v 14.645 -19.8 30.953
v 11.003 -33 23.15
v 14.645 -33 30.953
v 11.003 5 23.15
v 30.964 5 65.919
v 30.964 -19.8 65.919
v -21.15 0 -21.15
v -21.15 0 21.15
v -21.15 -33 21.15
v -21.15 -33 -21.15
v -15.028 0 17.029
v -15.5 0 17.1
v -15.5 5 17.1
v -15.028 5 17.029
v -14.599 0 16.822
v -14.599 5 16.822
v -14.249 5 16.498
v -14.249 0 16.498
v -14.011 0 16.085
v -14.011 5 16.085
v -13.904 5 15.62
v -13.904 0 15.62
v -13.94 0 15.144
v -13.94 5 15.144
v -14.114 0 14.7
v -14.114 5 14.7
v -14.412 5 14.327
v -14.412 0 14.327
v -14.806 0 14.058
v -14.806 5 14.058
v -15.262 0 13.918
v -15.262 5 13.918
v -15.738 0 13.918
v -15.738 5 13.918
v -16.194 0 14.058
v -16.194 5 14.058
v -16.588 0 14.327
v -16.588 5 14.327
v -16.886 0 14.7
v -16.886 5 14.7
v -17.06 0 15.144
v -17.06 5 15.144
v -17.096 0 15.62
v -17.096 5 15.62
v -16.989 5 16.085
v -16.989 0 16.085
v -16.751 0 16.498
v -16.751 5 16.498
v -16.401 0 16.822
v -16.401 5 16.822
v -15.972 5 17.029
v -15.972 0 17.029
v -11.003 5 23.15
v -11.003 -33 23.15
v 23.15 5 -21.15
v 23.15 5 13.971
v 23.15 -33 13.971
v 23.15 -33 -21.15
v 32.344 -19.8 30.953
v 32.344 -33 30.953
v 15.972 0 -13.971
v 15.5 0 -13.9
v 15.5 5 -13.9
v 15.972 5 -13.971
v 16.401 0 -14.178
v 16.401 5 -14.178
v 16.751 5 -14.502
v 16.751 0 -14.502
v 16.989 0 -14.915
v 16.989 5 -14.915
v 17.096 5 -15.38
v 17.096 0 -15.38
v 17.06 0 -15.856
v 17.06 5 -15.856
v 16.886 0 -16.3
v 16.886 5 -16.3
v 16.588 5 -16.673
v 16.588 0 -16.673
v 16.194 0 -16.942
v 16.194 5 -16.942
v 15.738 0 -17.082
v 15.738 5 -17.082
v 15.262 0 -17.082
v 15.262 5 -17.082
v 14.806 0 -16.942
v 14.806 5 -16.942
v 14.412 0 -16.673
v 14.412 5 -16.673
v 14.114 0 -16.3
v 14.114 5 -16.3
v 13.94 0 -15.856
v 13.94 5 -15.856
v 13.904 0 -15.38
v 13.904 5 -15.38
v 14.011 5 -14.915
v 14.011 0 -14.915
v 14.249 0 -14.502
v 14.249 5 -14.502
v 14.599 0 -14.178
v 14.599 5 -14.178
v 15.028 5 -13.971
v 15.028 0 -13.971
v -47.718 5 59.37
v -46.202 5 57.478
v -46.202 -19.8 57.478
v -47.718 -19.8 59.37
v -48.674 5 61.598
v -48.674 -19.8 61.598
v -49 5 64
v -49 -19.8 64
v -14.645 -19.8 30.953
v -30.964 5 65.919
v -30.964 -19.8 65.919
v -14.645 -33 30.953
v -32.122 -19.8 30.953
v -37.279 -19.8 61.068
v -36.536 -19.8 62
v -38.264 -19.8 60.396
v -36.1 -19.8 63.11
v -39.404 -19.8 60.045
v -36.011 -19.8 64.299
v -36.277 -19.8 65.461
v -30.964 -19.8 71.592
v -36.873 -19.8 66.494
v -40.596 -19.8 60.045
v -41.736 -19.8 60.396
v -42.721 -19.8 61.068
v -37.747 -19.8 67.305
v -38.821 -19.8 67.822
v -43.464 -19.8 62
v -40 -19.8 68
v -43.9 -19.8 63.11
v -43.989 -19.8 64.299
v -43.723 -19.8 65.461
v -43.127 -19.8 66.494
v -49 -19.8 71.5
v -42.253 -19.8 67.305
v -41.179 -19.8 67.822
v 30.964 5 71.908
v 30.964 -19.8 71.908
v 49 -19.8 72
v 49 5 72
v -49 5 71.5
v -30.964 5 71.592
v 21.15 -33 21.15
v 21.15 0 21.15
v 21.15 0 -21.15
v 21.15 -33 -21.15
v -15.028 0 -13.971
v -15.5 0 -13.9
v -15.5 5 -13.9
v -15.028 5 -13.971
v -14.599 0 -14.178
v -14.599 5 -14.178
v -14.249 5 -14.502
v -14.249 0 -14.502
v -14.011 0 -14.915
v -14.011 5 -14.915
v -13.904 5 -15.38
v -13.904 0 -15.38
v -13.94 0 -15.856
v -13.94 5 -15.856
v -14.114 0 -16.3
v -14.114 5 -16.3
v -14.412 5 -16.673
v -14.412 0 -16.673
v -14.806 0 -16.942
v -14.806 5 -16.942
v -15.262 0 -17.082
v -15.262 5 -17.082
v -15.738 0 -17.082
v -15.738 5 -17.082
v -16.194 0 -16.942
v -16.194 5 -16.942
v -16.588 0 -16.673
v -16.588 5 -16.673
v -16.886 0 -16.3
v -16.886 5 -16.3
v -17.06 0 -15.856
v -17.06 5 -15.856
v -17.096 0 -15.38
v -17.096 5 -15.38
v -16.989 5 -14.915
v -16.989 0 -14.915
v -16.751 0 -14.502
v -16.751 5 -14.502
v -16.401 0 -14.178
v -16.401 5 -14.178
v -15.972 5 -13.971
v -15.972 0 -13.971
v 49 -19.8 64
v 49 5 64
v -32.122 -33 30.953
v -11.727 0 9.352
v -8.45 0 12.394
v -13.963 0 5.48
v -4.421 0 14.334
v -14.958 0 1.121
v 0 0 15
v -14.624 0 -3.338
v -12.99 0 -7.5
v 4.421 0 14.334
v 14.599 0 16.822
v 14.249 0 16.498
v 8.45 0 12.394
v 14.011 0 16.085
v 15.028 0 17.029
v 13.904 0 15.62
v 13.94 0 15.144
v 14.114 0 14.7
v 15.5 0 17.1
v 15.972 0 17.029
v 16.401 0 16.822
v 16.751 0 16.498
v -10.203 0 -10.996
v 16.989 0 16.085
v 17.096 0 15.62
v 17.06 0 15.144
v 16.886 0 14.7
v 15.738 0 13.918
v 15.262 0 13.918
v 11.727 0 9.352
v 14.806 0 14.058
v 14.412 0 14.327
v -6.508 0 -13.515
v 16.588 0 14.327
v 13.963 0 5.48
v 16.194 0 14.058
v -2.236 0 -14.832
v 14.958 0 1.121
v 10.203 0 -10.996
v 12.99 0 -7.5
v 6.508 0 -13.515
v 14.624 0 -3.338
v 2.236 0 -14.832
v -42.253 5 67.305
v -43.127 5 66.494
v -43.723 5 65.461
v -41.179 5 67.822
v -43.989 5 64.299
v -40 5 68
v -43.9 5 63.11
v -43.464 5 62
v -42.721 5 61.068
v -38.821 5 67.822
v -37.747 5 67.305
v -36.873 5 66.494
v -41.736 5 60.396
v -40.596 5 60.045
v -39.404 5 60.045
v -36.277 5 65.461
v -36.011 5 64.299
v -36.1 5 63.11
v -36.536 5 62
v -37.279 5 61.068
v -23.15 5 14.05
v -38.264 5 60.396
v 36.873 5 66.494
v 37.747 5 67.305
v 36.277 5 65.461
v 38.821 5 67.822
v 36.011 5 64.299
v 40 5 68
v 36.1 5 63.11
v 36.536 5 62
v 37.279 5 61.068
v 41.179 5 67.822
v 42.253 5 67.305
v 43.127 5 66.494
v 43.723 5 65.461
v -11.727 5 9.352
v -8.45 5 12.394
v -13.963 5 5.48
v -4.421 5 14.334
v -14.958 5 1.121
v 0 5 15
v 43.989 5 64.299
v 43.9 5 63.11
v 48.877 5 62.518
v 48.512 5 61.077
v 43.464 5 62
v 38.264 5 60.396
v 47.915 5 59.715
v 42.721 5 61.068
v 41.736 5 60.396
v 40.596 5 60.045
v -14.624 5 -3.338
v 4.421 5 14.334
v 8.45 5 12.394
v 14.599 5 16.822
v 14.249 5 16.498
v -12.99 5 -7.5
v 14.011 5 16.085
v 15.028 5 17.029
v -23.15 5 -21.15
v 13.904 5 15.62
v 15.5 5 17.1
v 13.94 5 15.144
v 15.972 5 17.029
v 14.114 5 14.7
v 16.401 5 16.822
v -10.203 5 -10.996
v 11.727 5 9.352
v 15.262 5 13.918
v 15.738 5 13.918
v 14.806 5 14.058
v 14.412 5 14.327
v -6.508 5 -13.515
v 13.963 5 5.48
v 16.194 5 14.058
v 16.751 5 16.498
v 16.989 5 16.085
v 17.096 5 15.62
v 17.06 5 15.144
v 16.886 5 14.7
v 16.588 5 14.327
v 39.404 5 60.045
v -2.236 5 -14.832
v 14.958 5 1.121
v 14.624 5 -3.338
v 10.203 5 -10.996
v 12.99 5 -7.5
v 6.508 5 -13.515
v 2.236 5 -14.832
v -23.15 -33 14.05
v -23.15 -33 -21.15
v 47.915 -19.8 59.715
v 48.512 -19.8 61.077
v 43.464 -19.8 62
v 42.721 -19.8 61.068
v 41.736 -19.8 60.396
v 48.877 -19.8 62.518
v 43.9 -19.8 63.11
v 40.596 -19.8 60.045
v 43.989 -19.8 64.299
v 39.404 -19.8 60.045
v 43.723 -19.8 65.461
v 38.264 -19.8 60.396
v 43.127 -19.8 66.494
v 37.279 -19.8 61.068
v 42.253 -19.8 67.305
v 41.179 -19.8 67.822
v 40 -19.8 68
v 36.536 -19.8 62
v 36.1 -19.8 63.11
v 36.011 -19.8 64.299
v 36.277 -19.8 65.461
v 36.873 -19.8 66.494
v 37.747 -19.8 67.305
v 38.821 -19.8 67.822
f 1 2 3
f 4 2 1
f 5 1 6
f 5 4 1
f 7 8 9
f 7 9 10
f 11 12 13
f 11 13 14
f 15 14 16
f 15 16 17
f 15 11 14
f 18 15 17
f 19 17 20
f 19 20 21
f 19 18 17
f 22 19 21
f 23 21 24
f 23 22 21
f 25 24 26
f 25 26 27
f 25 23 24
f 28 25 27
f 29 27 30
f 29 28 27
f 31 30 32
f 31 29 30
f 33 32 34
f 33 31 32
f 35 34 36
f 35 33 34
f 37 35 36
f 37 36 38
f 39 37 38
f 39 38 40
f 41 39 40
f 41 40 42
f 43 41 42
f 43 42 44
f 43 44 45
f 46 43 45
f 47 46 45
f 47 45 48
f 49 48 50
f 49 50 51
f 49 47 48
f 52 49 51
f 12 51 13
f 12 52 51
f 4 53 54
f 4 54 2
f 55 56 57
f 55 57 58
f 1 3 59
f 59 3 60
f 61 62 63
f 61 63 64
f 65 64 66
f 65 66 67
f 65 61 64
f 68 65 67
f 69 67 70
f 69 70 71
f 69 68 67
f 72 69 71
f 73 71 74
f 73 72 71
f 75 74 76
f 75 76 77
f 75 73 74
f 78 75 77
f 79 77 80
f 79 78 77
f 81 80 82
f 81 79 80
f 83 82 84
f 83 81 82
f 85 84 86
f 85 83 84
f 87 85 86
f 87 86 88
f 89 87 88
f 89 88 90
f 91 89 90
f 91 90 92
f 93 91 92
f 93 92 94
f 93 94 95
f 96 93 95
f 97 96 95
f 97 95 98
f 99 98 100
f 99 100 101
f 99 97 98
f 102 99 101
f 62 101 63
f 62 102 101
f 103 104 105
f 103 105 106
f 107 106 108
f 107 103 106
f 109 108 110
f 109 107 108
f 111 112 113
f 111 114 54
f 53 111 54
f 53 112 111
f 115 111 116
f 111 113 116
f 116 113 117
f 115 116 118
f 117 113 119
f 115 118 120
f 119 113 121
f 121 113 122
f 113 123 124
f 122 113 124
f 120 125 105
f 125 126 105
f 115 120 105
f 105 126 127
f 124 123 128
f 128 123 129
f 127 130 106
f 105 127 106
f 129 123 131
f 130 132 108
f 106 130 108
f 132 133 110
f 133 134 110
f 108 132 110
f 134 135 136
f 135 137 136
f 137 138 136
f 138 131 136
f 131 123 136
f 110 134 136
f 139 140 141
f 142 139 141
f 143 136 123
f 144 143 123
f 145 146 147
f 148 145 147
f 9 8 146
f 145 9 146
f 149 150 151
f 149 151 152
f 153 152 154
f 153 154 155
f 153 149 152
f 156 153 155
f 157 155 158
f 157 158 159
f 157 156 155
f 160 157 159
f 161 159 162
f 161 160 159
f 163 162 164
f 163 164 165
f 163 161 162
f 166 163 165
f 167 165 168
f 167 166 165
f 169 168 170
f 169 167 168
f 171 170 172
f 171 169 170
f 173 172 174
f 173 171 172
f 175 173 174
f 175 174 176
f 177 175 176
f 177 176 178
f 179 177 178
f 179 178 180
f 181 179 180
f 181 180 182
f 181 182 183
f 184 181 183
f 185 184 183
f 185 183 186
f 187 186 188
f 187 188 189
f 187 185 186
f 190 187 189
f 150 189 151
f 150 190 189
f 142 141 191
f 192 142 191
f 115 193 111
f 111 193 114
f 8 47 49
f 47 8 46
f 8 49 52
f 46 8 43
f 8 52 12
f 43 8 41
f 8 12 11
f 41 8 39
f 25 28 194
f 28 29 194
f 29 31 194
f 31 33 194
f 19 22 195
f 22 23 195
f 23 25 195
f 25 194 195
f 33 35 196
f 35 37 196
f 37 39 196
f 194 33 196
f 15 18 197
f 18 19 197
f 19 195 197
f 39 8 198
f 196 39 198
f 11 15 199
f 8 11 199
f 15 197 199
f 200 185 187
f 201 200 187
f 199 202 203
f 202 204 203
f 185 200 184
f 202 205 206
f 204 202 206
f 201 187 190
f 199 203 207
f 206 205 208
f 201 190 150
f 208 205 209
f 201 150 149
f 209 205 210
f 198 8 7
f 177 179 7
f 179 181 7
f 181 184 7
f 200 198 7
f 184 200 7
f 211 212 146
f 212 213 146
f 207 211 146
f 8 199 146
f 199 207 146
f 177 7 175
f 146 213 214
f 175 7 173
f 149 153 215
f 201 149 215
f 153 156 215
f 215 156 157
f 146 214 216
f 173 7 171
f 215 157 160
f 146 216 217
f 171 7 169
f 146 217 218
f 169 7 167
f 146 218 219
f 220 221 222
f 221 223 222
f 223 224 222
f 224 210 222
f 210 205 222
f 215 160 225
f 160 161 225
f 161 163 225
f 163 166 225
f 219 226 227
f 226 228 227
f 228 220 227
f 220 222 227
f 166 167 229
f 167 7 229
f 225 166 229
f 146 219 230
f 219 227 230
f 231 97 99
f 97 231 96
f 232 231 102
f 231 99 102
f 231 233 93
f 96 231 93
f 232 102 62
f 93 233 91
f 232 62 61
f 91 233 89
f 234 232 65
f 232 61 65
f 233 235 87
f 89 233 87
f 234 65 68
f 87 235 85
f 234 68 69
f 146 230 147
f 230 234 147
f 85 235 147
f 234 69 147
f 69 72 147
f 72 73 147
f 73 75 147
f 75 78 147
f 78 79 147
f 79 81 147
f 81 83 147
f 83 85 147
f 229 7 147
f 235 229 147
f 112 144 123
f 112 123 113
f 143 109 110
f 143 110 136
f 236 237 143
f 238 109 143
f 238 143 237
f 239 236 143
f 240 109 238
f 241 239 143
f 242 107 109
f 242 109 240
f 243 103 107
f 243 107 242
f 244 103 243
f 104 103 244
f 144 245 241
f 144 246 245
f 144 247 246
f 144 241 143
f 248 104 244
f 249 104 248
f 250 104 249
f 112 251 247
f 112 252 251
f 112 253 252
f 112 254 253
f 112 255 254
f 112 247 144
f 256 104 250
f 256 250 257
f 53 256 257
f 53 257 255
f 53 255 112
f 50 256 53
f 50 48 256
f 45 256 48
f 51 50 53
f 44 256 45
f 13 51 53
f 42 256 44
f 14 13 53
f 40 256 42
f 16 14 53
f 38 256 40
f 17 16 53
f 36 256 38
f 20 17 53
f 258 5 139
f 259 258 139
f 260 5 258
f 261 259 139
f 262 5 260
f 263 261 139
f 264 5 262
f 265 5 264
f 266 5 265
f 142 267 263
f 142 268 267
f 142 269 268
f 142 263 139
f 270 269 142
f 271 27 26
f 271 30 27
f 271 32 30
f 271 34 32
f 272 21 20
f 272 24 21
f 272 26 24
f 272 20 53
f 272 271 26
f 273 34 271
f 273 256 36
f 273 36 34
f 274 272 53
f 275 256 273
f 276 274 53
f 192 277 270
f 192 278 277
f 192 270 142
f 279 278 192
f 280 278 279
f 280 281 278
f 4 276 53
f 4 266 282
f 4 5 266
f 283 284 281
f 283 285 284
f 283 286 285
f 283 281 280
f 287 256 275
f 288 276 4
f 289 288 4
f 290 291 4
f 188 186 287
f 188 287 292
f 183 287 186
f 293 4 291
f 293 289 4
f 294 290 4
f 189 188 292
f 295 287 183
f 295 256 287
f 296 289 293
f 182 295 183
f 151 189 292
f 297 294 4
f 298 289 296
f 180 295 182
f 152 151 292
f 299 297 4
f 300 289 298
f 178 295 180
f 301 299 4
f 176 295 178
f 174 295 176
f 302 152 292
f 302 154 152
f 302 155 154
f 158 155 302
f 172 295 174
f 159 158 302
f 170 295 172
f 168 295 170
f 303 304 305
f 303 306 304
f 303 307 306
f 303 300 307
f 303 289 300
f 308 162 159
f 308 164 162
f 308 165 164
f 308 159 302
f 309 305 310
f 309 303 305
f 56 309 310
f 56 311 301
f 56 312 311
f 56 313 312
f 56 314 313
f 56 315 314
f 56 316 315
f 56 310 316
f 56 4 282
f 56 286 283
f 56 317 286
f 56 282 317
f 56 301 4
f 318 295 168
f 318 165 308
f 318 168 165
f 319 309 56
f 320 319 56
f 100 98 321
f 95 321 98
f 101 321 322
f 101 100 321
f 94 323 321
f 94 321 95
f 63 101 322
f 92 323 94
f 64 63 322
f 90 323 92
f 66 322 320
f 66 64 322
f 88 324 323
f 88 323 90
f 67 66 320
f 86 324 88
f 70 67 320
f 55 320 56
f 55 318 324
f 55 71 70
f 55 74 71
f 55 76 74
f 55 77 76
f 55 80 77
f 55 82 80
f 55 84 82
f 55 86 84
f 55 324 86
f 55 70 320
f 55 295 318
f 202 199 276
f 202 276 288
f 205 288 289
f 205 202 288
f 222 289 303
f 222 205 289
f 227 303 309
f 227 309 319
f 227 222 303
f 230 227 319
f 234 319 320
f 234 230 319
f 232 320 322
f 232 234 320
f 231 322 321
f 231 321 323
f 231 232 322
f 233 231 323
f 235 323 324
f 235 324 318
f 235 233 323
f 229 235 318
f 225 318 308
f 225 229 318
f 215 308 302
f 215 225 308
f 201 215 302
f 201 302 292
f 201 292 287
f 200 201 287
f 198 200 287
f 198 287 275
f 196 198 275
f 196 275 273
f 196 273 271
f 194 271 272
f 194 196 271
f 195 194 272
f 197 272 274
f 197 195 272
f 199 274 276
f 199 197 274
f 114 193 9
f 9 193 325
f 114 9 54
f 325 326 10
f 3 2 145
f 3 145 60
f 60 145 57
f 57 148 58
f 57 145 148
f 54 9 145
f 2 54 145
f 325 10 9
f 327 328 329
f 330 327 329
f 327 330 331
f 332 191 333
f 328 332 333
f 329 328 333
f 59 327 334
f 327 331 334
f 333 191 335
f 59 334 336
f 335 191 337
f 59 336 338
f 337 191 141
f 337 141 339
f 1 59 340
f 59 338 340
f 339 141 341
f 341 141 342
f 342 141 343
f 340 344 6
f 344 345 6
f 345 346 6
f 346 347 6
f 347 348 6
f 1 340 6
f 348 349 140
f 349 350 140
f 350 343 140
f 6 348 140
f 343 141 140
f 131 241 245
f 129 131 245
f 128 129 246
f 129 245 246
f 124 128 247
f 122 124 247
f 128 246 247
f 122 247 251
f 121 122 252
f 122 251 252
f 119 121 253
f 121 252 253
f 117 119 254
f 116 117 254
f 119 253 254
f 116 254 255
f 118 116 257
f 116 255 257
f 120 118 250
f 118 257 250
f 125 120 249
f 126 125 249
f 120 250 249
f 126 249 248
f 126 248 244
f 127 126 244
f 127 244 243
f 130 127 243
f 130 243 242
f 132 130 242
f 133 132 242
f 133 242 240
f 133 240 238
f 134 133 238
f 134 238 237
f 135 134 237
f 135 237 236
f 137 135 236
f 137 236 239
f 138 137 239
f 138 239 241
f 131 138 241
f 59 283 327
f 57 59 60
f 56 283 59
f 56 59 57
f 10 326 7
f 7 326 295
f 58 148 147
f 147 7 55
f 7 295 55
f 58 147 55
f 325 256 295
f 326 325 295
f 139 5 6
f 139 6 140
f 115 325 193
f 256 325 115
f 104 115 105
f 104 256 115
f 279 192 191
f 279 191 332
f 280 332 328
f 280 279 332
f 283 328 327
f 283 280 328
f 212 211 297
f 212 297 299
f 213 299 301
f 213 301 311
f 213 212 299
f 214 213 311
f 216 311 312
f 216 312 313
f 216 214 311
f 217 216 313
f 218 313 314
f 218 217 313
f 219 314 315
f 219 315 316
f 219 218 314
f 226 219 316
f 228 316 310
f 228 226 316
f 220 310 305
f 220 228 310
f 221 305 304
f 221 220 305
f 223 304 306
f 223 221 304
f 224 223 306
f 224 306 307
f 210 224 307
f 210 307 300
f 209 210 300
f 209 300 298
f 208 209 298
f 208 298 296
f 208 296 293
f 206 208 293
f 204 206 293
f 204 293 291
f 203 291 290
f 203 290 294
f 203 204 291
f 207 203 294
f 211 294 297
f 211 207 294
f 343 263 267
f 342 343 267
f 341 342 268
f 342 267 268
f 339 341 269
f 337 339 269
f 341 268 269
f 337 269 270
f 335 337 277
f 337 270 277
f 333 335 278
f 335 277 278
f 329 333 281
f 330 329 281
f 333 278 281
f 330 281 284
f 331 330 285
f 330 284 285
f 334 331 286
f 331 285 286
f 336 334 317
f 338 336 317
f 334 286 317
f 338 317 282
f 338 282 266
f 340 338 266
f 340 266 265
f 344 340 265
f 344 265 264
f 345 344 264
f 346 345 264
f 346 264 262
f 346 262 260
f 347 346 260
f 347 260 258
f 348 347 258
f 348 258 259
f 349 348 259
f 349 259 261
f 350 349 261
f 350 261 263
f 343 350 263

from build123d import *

# Parameters (mm, degrees)
SKETCH_6_W          = 42.3
SKETCH_6_H          = 42.3
SKETCH_6_R          = 1.6
SKETCH_6_R_2        = 15
EXTRUDE_1_DEPTH     = 5
SKETCH_7_R          = 4
EXTRUDE_5_DEPTH     = 38
EXTRUDE_START       = 38
SKETCH_7_7_R        = 4
EXTRUDE_7_DEPTH     = 38
SKETCH_7_8_R        = 4
EXTRUDE_8_DEPTH     = 38
SKETCH_12_W         = 2
SKETCH_12_H         = 44.3
EXTRUDE_11_DEPTH    = 38
SKETCH_14_W         = 44.3
SKETCH_14_H         = 2
EXTRUDE_12_DEPTH    = 38
SKETCH_15_W         = 2
SKETCH_15_H         = 42.3
EXTRUDE_13_DEPTH    = 38
CUT_EXTRUDE_1_DEPTH = 13.2


with BuildPart() as part:
    # 草图6 → 凸台-拉伸1 (new body)
    with BuildSketch(Plane(origin=(0, 0, 0), x_dir=(1, 0, 0), z_dir=(0, 1, 0))):
        Rectangle(SKETCH_6_W, SKETCH_6_H)
        with Locations(Location((15.5, 15.5, 0), (0, 0, 270))):
            Circle(SKETCH_6_R, mode=Mode.SUBTRACT)
        with Locations(Location((-15.5, 15.5, 0), (0, 0, 270))):
            Circle(SKETCH_6_R, mode=Mode.SUBTRACT)
        with Locations(Location((-15.5, -15.5, 0), (0, 0, 270))):
            Circle(SKETCH_6_R, mode=Mode.SUBTRACT)
        with Locations(Location((15.5, -15.5, 0), (0, 0, 270))):
            Circle(SKETCH_6_R, mode=Mode.SUBTRACT)
        with Locations(Location((0, 0, 0), (0, 0, 270))):
            Circle(SKETCH_6_R_2, mode=Mode.SUBTRACT)
    extrude(amount=EXTRUDE_1_DEPTH)

    # 草图7 → 凸台-拉伸5 (add)
    # profile 1 of 2: a face of its own
    with BuildSketch(Plane(origin=(0, 5, 0), x_dir=(1, 0, 0), z_dir=(0, 1, 0))):
        with BuildLine():
            Line((49, -72), (49, -64))
            ThreePointArc((49, -64), (48.724429591, -61.789948347), (47.914593709, -59.715235547))
            Line((47.914593709, -59.715235547), (21.15, -10.277072187))
            Line((21.15, -10.277072187), (21.15, -21.15))
            Line((21.15, -21.15), (10.070005019, -21.15))
            Line((10.070005019, -21.15), (30.963898233, -65.919418373))
            Line((30.963898233, -65.919418373), (30.963898233, -71.907979073))
            Line((30.963898233, -71.907979073), (49, -72))
        make_face()
        with Locations(Location((40, -64, 0), (0, 0, 270))):
            Circle(SKETCH_7_R, mode=Mode.SUBTRACT)
    # profile 2 of 2: a face of its own
    with BuildSketch(Plane(origin=(0, 5, 0), x_dir=(1, 0, 0), z_dir=(0, 1, 0))):
        with BuildLine():
            Line((-30.963898233, -65.919418373), (-10.070005019, -21.15))
            Line((-10.070005019, -21.15), (-21.15, -21.15))
            Line((-21.15, -21.15), (-21.15, -10.282583808))
            Line((-21.15, -10.282583808), (-46.202269248, -57.478354795))
            ThreePointArc((-46.202269248, -57.478354795), (-48.271046585, -60.45179082), (-49, -64))
            Line((-49, -64), (-49, -71.5))
            Line((-49, -71.5), (-30.963898233, -71.592020927))
            Line((-30.963898233, -71.592020927), (-30.963898233, -65.919418373))
        make_face()
        with Locations(Location((-40, -64, 0), (0, 0, 270))):
            Circle(SKETCH_7_R, mode=Mode.SUBTRACT)
    extrude(amount=-EXTRUDE_5_DEPTH)

    # 草图7<7> → 凸台-拉伸7 (add)
    with BuildSketch(Plane(origin=(0, 5, 0), x_dir=(1, 0, 0), z_dir=(0, 1, 0)).offset(EXTRUDE_START)):
        with Locations(Location((-40, -64, 0), (0, 0, 270))):
            Circle(SKETCH_7_7_R)
        with Locations(Location((40, -64, 0), (0, 0, 270))):
            Circle(SKETCH_7_7_R)
    extrude(amount=-EXTRUDE_7_DEPTH)


with BuildPart() as extrude_7_kept_piece:
    # of the separate pieces the step leaves, the one the design keeps (extrude_7_pieces_kept)
    add(part.part.solids().sort_by_distance((-10.070005019, 0, 21.15))[0])

    # 草图7<8> → 凸台-拉伸8 (add)
    with BuildSketch(Plane(origin=(0, 5, 0), x_dir=(1, 0, 0), z_dir=(0, 1, 0))):
        with Locations(Location((-40, -64, 0), (0, 0, 270))):
            Circle(SKETCH_7_8_R)
        with Locations(Location((40, -64, 0), (0, 0, 270))):
            Circle(SKETCH_7_8_R)
    extrude(amount=EXTRUDE_8_DEPTH)


with BuildPart() as extrude_8_kept_piece:
    # of the separate pieces the step leaves, the one the design keeps (extrude_8_pieces_kept)
    add(extrude_7_kept_piece.part.solids().sort_by_distance((-10.070005019, 0, 21.15))[0])

    # 草图12 → 凸台-拉伸11 (add)
    with BuildSketch(Plane(origin=(0, 5, 0), x_dir=(1, 0, 0), z_dir=(0, 1, 0))):
        with Locations((22.15, -1)):
            Rectangle(SKETCH_12_W, SKETCH_12_H)
    extrude(amount=-EXTRUDE_11_DEPTH)

    # 草图14 → 凸台-拉伸12 (add)
    with BuildSketch(Plane(origin=(0, 5, 0), x_dir=(1, 0, 0), z_dir=(0, 1, 0))):
        with Locations((-1, -22.15)):
            Rectangle(SKETCH_14_W, SKETCH_14_H)
    extrude(amount=-EXTRUDE_12_DEPTH)

    # 草图15 → 凸台-拉伸13 (add)
    with BuildSketch(Plane(origin=(0, 5, 0), x_dir=(1, 0, 0), z_dir=(0, 1, 0))):
        with Locations((-22.15, 0)):
            Rectangle(SKETCH_15_W, SKETCH_15_H)
    extrude(amount=-EXTRUDE_13_DEPTH)

    # 草图17 → 切除-拉伸1 (cut)
    with BuildSketch(Plane.XZ.offset(33)):
        Polygon((62.040525686, 30.953335803), (-8.604799232, 30.953335803), (-61.83718559, 30.953335803), (-61.83718559, 85.06296978), (-8.604799232, 85.06296978), (62.040525686, 85.06296978), align=None)
    extrude(amount=-CUT_EXTRUDE_1_DEPTH, mode=Mode.SUBTRACT)


solid = extrude_8_kept_piece.part
